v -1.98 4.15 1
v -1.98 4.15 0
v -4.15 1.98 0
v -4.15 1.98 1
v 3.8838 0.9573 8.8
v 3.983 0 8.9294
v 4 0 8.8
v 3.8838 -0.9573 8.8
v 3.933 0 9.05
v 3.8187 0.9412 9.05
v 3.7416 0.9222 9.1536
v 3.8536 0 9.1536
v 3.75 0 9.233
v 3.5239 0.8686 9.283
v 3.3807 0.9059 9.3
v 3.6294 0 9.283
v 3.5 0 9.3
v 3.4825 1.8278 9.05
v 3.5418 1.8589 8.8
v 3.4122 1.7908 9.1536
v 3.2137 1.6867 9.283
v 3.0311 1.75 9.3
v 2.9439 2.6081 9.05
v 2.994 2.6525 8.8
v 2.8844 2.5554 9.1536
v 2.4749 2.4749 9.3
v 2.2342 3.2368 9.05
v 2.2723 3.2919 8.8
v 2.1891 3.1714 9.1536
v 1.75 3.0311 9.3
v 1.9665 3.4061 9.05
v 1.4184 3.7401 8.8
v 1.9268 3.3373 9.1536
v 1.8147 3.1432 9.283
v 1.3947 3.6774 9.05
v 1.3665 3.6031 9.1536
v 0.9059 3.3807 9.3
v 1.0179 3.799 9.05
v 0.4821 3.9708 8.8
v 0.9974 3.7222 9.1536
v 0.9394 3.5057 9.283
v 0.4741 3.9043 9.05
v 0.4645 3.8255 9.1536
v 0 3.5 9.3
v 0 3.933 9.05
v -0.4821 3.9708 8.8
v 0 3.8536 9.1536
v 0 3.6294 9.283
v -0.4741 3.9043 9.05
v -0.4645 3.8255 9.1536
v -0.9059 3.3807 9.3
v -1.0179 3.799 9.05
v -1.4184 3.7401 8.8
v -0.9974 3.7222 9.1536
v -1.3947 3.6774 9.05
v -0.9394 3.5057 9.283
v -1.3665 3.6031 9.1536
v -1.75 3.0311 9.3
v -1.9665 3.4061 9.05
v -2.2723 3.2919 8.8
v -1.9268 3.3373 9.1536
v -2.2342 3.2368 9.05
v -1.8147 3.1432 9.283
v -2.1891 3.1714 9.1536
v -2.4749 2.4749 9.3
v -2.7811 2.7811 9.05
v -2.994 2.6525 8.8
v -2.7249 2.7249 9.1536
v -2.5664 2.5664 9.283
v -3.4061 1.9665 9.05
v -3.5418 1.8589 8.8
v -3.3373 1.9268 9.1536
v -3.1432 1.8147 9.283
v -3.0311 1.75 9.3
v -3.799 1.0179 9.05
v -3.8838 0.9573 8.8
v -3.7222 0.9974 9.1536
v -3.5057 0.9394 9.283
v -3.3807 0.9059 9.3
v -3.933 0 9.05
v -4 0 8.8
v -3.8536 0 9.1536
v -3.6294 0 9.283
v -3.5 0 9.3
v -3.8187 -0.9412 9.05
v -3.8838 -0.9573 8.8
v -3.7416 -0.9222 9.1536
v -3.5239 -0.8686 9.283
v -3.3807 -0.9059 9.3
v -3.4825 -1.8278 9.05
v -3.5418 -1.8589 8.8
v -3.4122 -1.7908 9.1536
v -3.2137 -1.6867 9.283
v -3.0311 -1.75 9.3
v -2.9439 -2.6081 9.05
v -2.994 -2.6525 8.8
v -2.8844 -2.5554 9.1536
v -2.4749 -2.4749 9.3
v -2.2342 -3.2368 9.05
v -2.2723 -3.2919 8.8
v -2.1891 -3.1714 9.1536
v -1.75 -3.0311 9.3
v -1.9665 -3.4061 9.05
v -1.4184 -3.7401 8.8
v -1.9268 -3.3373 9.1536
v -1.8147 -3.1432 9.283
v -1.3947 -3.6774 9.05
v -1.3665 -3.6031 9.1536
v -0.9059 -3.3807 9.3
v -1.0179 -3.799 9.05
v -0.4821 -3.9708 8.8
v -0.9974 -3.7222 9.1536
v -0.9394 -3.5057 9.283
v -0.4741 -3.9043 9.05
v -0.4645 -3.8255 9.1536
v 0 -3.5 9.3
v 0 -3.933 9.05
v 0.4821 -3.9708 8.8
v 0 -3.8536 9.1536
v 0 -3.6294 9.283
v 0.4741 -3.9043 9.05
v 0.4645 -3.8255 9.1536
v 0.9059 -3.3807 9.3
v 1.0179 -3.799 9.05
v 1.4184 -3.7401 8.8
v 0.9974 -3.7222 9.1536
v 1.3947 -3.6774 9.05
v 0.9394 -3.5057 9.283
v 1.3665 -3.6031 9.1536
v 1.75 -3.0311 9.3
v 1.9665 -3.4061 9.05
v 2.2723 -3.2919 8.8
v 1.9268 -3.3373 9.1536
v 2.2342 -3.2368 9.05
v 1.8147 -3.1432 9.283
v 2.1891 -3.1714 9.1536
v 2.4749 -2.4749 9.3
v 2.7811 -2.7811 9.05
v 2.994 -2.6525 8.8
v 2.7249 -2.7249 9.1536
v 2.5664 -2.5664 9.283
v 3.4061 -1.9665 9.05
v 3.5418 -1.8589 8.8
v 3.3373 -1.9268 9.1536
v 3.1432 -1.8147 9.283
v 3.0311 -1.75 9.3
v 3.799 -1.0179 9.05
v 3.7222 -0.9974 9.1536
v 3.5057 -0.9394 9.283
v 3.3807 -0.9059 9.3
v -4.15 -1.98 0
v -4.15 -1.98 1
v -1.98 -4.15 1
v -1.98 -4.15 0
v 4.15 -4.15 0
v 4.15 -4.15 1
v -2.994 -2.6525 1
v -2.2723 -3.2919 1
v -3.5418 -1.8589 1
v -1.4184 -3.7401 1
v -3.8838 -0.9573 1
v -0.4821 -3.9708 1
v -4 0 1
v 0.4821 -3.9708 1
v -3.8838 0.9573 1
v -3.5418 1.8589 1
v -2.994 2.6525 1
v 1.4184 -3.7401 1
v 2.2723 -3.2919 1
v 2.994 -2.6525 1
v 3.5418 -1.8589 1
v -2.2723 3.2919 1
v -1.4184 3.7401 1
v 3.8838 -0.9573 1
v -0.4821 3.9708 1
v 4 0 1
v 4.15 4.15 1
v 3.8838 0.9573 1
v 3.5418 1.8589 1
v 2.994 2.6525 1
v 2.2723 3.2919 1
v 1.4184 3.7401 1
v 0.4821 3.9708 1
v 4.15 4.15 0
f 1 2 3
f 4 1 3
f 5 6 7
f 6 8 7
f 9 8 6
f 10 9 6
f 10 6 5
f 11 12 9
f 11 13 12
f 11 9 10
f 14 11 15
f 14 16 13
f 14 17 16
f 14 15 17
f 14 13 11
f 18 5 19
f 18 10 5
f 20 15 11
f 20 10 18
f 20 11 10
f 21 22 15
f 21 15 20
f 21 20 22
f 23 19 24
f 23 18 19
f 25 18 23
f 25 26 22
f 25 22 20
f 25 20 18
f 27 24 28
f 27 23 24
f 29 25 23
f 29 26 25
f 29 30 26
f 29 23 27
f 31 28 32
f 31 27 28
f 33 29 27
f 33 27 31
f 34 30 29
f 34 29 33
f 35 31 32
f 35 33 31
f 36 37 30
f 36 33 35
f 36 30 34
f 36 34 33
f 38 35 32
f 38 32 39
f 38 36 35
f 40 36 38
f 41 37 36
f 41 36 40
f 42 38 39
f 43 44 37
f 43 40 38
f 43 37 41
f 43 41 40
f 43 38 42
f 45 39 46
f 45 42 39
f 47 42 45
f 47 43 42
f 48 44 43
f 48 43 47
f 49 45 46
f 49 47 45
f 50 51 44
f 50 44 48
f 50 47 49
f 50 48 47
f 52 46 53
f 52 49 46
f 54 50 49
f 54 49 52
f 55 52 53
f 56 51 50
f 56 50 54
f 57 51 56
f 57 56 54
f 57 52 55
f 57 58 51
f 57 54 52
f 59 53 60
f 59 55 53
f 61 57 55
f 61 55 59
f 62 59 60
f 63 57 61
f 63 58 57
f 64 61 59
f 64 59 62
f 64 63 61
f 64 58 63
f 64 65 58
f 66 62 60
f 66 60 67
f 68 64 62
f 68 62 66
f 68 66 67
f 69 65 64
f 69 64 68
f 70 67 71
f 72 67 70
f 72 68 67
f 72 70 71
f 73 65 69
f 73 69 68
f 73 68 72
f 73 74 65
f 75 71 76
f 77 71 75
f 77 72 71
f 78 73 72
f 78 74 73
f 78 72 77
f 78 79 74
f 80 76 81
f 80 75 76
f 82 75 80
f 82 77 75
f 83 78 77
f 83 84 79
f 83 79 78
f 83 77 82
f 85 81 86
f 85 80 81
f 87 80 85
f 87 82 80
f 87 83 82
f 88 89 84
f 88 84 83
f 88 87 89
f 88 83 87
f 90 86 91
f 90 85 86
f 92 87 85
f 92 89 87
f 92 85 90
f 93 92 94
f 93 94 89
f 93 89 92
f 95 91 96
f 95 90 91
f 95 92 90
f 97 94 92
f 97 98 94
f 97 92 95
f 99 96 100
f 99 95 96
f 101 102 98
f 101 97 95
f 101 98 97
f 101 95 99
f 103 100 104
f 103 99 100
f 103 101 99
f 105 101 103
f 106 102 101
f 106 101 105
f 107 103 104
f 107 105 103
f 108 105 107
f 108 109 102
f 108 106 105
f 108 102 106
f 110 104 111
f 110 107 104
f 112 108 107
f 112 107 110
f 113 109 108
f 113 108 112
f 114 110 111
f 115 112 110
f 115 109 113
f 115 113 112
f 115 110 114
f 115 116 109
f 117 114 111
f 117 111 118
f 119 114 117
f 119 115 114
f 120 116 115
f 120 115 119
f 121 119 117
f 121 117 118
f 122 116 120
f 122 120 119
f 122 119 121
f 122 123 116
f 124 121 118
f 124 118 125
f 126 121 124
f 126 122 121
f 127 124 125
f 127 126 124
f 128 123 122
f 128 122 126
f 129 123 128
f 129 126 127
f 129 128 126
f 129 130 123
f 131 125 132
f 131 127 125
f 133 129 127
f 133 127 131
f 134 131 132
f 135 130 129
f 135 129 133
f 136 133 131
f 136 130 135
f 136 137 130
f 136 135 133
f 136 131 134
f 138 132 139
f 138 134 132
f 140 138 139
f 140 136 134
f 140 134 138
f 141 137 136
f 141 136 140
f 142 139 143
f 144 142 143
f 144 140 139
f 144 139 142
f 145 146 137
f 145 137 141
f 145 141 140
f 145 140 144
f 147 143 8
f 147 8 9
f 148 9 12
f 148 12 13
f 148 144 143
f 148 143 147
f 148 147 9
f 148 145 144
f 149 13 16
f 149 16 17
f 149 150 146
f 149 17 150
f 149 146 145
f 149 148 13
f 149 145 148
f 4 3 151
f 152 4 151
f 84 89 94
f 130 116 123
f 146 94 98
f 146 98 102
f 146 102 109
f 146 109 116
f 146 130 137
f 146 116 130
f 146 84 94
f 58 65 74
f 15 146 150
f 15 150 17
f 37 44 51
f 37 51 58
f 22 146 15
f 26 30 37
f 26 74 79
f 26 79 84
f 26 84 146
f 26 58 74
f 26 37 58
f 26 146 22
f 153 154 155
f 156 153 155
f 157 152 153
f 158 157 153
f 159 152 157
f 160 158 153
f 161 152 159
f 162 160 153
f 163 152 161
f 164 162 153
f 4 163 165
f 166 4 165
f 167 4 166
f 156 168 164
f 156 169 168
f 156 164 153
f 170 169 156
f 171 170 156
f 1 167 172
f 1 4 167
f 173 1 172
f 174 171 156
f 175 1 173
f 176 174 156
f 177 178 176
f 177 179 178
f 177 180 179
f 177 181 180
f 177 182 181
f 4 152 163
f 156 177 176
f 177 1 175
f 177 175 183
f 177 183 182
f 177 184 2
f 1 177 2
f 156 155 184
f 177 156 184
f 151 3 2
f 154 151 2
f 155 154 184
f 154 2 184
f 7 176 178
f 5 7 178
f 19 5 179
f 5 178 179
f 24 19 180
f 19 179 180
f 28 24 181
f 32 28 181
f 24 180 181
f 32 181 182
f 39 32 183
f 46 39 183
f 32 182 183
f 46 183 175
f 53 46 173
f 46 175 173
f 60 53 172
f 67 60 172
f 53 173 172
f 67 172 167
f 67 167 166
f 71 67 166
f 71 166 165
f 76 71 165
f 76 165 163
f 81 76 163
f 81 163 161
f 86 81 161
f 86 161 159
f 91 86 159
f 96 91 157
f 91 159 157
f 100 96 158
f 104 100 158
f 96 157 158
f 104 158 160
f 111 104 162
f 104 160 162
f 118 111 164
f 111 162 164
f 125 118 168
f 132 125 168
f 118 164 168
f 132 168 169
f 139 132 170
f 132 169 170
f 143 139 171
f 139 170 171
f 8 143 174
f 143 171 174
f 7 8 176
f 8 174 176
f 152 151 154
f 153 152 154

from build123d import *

# Parameters (mm, degrees)
BOSS_EXTRUDE1_DEPTH = 1
SKETCH3_R           = 4
BOSS_EXTRUDE2_DEPTH = 8.3
FILLET2_R           = 0.5


with BuildPart() as part:
    # Sketch2 → Boss-Extrude1 (new body)
    with BuildSketch(Plane.XY):
        Polygon((-1.98, 4.15), (-4.15, 1.98), (-4.15, -1.98), (-1.98, -4.15), (4.15, -4.15), (4.15, 4.15), align=None)
    extrude(amount=BOSS_EXTRUDE1_DEPTH)

    # Sketch3 → Boss-Extrude2 (add)
    with BuildSketch(Plane.XY.offset(1)):
        Circle(SKETCH3_R)
    extrude(amount=BOSS_EXTRUDE2_DEPTH)

    # Fillet2
    fillet2_edges = [part.edges().sort_by_distance(p)[0] for p in [
        (-4, 0, 9.3),
    ]]
    fillet(fillet2_edges, radius=FILLET2_R)


solid = part.part
